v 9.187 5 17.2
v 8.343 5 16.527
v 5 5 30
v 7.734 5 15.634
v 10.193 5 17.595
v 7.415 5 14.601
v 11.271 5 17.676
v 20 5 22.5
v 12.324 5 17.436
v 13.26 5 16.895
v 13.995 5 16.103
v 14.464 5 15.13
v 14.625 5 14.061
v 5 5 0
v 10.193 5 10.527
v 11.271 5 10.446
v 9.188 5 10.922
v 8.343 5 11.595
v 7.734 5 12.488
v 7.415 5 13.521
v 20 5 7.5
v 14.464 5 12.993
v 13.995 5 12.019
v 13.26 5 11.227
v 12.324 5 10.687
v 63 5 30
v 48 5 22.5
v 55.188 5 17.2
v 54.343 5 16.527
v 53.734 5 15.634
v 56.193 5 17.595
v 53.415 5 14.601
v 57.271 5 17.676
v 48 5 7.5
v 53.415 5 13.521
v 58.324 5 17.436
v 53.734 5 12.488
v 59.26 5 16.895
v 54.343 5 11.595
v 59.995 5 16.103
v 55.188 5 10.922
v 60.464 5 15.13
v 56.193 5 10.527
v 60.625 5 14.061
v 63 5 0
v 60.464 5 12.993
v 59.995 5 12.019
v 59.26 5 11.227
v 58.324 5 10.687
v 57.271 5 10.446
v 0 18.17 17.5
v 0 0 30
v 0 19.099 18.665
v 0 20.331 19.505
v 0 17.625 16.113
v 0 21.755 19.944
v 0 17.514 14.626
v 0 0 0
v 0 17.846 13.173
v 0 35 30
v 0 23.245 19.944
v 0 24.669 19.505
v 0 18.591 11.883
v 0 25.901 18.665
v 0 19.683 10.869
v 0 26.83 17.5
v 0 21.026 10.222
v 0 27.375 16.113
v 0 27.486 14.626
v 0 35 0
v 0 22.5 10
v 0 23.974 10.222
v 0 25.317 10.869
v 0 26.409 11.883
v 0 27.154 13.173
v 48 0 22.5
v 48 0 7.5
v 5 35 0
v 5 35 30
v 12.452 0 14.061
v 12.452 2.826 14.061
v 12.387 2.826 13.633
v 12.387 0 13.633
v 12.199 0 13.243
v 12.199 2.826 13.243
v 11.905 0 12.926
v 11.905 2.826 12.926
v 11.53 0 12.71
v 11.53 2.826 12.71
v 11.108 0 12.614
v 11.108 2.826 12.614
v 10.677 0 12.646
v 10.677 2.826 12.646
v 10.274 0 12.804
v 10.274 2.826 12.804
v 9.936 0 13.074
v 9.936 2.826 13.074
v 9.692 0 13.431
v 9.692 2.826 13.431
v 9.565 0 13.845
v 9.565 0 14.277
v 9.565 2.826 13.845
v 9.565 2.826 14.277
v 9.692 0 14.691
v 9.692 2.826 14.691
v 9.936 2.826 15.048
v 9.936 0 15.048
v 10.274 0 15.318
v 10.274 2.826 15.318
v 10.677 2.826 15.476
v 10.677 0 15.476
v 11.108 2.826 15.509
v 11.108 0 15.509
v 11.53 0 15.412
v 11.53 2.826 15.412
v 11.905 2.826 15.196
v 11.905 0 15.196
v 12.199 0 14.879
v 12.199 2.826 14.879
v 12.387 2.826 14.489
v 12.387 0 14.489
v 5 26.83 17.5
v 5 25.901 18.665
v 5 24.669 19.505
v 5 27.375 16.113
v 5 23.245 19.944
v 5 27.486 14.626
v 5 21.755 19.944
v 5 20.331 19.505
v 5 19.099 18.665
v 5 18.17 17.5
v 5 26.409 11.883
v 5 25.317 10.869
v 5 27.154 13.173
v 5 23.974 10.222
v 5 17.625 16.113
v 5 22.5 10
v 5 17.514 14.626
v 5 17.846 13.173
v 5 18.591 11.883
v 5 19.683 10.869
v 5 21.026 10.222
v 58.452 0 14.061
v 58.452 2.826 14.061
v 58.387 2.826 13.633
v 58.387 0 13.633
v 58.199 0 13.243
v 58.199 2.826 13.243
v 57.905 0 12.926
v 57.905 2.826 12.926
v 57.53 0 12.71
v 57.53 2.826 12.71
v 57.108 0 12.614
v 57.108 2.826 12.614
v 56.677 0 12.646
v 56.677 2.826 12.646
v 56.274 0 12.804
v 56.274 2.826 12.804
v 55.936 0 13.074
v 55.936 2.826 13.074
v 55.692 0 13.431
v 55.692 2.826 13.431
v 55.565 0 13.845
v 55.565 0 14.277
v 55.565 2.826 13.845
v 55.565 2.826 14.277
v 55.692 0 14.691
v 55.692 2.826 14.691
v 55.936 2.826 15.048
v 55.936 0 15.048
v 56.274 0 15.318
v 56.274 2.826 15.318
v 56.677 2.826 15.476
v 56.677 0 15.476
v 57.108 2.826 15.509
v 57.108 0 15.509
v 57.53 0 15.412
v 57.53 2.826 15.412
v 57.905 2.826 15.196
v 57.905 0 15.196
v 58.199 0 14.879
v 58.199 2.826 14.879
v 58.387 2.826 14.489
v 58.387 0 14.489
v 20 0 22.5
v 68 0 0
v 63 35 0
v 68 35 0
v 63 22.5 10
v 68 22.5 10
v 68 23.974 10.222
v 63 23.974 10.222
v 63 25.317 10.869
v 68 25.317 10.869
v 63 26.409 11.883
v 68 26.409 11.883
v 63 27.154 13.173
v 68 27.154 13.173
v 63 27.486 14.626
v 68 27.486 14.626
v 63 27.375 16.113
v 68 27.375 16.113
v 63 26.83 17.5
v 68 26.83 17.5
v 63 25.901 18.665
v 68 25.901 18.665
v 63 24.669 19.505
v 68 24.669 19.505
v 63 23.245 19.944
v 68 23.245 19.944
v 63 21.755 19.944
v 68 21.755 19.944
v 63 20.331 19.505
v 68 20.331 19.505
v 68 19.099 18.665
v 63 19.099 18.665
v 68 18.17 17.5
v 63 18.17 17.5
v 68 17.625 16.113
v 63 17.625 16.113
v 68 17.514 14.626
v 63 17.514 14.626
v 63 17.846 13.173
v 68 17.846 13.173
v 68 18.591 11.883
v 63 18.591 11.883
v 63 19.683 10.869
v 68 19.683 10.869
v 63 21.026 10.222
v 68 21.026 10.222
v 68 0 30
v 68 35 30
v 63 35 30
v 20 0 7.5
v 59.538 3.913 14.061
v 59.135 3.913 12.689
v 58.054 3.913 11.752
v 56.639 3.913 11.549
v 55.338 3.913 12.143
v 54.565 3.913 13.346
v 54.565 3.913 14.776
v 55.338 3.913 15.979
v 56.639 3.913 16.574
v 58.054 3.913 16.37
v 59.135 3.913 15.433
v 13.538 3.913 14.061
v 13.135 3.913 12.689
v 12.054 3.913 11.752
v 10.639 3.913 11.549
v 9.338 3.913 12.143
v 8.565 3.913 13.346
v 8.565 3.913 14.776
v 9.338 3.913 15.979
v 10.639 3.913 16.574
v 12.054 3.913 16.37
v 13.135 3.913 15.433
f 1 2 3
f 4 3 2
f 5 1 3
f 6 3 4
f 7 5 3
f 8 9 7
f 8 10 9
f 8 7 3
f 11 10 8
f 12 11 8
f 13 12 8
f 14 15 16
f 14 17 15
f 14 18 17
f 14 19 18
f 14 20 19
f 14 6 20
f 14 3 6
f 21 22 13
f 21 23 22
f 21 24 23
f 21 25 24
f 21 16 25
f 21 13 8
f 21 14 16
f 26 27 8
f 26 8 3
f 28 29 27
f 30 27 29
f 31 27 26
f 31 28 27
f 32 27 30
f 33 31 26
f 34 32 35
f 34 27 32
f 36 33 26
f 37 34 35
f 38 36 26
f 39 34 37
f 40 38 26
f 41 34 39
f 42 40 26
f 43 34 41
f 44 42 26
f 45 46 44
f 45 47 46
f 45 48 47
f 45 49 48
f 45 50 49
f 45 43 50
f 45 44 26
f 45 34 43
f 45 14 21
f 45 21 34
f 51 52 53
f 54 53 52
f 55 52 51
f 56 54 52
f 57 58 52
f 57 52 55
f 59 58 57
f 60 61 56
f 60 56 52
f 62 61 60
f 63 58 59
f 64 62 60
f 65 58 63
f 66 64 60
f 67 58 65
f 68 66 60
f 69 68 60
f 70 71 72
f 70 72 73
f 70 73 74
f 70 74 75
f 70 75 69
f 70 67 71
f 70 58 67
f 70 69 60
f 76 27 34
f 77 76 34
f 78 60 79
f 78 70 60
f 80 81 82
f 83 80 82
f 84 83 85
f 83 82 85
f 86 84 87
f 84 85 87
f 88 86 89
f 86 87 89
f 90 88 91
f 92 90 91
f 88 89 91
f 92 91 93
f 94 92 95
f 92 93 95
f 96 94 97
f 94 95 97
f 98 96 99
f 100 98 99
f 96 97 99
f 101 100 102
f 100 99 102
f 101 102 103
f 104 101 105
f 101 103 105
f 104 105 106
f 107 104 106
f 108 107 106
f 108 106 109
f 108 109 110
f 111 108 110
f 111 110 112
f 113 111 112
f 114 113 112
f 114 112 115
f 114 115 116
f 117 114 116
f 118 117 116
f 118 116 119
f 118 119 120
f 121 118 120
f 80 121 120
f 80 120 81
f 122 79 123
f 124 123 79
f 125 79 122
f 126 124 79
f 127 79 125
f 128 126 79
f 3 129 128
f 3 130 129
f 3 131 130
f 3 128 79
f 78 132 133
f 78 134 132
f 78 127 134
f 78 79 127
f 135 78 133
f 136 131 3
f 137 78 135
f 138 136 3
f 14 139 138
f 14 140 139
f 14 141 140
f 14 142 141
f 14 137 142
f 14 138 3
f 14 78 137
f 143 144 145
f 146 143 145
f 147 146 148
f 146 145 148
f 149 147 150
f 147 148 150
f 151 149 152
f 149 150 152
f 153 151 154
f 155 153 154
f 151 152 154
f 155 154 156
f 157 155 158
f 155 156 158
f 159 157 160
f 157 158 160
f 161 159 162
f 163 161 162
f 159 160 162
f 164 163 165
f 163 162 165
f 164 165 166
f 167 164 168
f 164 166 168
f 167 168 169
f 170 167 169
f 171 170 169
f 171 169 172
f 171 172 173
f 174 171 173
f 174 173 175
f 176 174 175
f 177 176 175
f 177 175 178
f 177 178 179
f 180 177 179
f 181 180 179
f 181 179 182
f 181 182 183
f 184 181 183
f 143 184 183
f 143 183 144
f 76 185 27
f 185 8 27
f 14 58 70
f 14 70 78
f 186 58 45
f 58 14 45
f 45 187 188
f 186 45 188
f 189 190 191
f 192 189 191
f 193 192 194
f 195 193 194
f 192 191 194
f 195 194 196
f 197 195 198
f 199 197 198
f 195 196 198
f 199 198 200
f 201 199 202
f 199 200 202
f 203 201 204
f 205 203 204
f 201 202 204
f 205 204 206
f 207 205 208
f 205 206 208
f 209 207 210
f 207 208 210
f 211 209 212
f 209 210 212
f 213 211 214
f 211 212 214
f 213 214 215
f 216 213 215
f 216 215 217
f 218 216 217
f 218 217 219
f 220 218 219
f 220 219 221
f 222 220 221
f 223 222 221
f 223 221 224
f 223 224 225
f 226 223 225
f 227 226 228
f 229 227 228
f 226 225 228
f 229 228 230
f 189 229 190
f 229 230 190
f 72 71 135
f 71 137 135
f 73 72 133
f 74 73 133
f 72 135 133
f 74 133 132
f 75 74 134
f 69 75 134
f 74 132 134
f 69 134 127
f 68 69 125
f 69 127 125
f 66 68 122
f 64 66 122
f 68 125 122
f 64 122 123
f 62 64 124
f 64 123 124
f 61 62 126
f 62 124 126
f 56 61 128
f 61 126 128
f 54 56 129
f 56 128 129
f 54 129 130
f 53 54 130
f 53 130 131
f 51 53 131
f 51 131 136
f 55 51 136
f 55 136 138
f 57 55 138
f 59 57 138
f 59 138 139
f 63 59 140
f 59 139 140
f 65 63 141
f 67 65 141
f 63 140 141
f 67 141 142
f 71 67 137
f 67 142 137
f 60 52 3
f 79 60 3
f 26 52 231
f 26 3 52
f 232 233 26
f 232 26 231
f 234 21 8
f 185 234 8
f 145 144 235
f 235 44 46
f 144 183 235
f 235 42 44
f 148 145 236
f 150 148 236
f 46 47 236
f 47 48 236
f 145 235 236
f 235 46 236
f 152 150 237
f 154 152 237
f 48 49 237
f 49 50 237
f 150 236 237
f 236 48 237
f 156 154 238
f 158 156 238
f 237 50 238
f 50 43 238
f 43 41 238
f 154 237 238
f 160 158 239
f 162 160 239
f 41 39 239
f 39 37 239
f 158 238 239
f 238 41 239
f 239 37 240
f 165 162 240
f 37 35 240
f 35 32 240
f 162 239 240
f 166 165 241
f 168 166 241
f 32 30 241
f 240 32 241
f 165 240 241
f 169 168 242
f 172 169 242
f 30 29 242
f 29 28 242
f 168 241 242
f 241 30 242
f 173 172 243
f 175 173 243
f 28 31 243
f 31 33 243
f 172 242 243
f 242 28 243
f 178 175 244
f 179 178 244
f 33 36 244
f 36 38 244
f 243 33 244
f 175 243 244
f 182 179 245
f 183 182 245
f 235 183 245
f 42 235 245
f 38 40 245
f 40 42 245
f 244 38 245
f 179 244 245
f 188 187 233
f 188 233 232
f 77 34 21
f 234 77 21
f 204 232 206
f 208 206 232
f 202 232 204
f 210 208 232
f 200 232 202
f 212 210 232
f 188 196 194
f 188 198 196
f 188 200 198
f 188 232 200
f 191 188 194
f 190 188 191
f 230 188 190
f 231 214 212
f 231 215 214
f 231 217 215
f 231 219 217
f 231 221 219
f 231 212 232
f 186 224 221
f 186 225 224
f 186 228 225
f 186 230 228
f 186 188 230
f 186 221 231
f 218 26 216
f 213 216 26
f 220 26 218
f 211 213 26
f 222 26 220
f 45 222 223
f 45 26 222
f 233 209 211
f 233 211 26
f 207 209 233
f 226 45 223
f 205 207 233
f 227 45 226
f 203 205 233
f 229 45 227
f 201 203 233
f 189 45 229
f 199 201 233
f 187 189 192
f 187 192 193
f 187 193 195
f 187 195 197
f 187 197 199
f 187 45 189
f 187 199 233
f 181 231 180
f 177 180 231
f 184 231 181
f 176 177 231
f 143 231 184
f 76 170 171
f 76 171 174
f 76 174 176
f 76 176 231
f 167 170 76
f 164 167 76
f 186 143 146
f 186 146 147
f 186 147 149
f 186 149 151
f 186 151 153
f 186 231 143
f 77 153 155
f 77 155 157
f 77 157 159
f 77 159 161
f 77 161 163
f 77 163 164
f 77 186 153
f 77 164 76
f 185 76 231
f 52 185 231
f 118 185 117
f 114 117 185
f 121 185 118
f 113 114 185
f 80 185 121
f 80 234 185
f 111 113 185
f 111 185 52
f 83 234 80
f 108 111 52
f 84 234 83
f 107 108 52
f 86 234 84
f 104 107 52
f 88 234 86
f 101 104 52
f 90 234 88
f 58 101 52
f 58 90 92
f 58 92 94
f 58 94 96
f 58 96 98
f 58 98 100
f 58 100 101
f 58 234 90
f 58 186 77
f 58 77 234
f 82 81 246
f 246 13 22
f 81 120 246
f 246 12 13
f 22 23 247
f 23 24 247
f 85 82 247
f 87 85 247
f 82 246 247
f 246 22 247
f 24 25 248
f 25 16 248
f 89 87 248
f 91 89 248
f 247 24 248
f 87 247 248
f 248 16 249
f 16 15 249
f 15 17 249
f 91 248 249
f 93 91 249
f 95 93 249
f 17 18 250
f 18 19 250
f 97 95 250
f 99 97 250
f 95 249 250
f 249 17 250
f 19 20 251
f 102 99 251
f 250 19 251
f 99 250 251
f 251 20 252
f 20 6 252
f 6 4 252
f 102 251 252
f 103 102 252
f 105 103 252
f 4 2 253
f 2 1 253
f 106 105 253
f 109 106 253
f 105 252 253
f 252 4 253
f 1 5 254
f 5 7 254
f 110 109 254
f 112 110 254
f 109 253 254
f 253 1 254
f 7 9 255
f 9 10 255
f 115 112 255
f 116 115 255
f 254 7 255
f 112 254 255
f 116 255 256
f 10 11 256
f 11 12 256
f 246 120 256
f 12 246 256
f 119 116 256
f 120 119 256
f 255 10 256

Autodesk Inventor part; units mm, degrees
ref_plane "YZ Plane" through (0, 0, 0) normal (1, 0, 0) x (0, 1, 0)
ref_plane "XZ Plane" through (0, 0, 0) normal (0, 1, 0) x (-1, 0, 0)
ref_plane "XY Plane" through (0, 0, 0) normal (0, 0, 1) x (1, 0, 0)
sketch "Sketch1" plane through (0, 0, 0) normal (0, 0, 1) x (1, 0, 0)
  line L0 (0, 0) -> (0, 35)
  line L1 (0, 35) -> (5, 35)
  line L2 (5, 35) -> (5, 5)
  line L3 (5, 5) -> (63, 5)
  line L4 (63, 5) -> (63, 35)
  line L5 (63, 35) -> (68, 35)
  line L6 (68, 35) -> (68, 0)
  line L7 (68, 0) -> (0, 0)
  dimension "d0" = 35
  dimension "d1" = 5
  dimension "d2" = 30
  dimension "d3" = 58
  dimension "d4" = 30
  dimension "d5" = 5
extrude "Extrusion1" add sketch "Sketch1" along normal blind 30
sketch "Sketch2" plane through (68, 0, 0) normal (1, 0, 0) x (0, 0, -1)
  circle A0 centre (-15, 22.5) radius 5
  line L0 (0, 35) -> (-30, 35) projected
  line L1 (0, 0) -> (0, 35) projected
  dimension "d8" = 10
  dimension "d9" = 12.5
  dimension "d10" = 15
extrude "Extrusion2" cut sketch "Sketch2" against normal through all
sketch "Sketch3" plane through (5, 5, 0) normal (0, 1, 0) x (1, 0, 0)
  line L0 (15, -22.5) -> (43, -22.5)
  line L1 (43, -22.5) -> (43, -7.5)
  line L2 (43, -7.5) -> (15, -7.5)
  line L3 (15, -7.5) -> (15, -22.5)
  line L4 (15, -22.5) -> (43, -7.5) construction
  line L5 (43, -22.5) -> (15, -7.5) construction
  line L6 (58, 0) -> (0, 0) projected
  line L7 (0, 0) -> (0, -30) projected
  point P0 (-5, 0)
  point P1 (29, -15)
  dimension "d13" = 28
  dimension "d14" = 15
  dimension "d15" = 15
  dimension "d16" = 29
extrude "Extrusion3" cut sketch "Sketch3" against normal through all
sketch "Sketch4" plane through (5, 5, 0) normal (0, 1, 0) x (1, 0, 0)
  circle A0 centre (6, -14.0611) radius 3.625
  line L0 (0, -10) -> (0, -20) projected
  circle A1 centre (52, -14.0611) radius 3.625
  line L1 (43, -7.5) -> (43, -22.5) projected
  point P0 (-5, 0)
  dimension "d19" = 7.25
  dimension "d20" = 6
  dimension "d21" = 7.25
  dimension "d22" = 9
extrude "Extrusion4" cut sketch "Sketch4" against normal blind 2.1735 draft -45
sketch "Sketch5" plane through (11, 2.8265, 14.0611) normal (0, 1, 0) x (1, 0, 0)
  circle A0 centre (0, 0) radius 1.4515
  circle A1 centre (46, 0) radius 1.4515 projected
  circle A2 centre (46, 0) radius 1.4515
  point P0 (-11, 14.0611)
extrude "Extrusion5" cut sketch "Sketch5" against normal through all
sketch "Sketch6" plane through (5, 5, 0) normal (0, 1, 0) x (1, 0, 0)
  point P0 (-5, 0)
properties part number "1st arm to 2nd linking clamp"
